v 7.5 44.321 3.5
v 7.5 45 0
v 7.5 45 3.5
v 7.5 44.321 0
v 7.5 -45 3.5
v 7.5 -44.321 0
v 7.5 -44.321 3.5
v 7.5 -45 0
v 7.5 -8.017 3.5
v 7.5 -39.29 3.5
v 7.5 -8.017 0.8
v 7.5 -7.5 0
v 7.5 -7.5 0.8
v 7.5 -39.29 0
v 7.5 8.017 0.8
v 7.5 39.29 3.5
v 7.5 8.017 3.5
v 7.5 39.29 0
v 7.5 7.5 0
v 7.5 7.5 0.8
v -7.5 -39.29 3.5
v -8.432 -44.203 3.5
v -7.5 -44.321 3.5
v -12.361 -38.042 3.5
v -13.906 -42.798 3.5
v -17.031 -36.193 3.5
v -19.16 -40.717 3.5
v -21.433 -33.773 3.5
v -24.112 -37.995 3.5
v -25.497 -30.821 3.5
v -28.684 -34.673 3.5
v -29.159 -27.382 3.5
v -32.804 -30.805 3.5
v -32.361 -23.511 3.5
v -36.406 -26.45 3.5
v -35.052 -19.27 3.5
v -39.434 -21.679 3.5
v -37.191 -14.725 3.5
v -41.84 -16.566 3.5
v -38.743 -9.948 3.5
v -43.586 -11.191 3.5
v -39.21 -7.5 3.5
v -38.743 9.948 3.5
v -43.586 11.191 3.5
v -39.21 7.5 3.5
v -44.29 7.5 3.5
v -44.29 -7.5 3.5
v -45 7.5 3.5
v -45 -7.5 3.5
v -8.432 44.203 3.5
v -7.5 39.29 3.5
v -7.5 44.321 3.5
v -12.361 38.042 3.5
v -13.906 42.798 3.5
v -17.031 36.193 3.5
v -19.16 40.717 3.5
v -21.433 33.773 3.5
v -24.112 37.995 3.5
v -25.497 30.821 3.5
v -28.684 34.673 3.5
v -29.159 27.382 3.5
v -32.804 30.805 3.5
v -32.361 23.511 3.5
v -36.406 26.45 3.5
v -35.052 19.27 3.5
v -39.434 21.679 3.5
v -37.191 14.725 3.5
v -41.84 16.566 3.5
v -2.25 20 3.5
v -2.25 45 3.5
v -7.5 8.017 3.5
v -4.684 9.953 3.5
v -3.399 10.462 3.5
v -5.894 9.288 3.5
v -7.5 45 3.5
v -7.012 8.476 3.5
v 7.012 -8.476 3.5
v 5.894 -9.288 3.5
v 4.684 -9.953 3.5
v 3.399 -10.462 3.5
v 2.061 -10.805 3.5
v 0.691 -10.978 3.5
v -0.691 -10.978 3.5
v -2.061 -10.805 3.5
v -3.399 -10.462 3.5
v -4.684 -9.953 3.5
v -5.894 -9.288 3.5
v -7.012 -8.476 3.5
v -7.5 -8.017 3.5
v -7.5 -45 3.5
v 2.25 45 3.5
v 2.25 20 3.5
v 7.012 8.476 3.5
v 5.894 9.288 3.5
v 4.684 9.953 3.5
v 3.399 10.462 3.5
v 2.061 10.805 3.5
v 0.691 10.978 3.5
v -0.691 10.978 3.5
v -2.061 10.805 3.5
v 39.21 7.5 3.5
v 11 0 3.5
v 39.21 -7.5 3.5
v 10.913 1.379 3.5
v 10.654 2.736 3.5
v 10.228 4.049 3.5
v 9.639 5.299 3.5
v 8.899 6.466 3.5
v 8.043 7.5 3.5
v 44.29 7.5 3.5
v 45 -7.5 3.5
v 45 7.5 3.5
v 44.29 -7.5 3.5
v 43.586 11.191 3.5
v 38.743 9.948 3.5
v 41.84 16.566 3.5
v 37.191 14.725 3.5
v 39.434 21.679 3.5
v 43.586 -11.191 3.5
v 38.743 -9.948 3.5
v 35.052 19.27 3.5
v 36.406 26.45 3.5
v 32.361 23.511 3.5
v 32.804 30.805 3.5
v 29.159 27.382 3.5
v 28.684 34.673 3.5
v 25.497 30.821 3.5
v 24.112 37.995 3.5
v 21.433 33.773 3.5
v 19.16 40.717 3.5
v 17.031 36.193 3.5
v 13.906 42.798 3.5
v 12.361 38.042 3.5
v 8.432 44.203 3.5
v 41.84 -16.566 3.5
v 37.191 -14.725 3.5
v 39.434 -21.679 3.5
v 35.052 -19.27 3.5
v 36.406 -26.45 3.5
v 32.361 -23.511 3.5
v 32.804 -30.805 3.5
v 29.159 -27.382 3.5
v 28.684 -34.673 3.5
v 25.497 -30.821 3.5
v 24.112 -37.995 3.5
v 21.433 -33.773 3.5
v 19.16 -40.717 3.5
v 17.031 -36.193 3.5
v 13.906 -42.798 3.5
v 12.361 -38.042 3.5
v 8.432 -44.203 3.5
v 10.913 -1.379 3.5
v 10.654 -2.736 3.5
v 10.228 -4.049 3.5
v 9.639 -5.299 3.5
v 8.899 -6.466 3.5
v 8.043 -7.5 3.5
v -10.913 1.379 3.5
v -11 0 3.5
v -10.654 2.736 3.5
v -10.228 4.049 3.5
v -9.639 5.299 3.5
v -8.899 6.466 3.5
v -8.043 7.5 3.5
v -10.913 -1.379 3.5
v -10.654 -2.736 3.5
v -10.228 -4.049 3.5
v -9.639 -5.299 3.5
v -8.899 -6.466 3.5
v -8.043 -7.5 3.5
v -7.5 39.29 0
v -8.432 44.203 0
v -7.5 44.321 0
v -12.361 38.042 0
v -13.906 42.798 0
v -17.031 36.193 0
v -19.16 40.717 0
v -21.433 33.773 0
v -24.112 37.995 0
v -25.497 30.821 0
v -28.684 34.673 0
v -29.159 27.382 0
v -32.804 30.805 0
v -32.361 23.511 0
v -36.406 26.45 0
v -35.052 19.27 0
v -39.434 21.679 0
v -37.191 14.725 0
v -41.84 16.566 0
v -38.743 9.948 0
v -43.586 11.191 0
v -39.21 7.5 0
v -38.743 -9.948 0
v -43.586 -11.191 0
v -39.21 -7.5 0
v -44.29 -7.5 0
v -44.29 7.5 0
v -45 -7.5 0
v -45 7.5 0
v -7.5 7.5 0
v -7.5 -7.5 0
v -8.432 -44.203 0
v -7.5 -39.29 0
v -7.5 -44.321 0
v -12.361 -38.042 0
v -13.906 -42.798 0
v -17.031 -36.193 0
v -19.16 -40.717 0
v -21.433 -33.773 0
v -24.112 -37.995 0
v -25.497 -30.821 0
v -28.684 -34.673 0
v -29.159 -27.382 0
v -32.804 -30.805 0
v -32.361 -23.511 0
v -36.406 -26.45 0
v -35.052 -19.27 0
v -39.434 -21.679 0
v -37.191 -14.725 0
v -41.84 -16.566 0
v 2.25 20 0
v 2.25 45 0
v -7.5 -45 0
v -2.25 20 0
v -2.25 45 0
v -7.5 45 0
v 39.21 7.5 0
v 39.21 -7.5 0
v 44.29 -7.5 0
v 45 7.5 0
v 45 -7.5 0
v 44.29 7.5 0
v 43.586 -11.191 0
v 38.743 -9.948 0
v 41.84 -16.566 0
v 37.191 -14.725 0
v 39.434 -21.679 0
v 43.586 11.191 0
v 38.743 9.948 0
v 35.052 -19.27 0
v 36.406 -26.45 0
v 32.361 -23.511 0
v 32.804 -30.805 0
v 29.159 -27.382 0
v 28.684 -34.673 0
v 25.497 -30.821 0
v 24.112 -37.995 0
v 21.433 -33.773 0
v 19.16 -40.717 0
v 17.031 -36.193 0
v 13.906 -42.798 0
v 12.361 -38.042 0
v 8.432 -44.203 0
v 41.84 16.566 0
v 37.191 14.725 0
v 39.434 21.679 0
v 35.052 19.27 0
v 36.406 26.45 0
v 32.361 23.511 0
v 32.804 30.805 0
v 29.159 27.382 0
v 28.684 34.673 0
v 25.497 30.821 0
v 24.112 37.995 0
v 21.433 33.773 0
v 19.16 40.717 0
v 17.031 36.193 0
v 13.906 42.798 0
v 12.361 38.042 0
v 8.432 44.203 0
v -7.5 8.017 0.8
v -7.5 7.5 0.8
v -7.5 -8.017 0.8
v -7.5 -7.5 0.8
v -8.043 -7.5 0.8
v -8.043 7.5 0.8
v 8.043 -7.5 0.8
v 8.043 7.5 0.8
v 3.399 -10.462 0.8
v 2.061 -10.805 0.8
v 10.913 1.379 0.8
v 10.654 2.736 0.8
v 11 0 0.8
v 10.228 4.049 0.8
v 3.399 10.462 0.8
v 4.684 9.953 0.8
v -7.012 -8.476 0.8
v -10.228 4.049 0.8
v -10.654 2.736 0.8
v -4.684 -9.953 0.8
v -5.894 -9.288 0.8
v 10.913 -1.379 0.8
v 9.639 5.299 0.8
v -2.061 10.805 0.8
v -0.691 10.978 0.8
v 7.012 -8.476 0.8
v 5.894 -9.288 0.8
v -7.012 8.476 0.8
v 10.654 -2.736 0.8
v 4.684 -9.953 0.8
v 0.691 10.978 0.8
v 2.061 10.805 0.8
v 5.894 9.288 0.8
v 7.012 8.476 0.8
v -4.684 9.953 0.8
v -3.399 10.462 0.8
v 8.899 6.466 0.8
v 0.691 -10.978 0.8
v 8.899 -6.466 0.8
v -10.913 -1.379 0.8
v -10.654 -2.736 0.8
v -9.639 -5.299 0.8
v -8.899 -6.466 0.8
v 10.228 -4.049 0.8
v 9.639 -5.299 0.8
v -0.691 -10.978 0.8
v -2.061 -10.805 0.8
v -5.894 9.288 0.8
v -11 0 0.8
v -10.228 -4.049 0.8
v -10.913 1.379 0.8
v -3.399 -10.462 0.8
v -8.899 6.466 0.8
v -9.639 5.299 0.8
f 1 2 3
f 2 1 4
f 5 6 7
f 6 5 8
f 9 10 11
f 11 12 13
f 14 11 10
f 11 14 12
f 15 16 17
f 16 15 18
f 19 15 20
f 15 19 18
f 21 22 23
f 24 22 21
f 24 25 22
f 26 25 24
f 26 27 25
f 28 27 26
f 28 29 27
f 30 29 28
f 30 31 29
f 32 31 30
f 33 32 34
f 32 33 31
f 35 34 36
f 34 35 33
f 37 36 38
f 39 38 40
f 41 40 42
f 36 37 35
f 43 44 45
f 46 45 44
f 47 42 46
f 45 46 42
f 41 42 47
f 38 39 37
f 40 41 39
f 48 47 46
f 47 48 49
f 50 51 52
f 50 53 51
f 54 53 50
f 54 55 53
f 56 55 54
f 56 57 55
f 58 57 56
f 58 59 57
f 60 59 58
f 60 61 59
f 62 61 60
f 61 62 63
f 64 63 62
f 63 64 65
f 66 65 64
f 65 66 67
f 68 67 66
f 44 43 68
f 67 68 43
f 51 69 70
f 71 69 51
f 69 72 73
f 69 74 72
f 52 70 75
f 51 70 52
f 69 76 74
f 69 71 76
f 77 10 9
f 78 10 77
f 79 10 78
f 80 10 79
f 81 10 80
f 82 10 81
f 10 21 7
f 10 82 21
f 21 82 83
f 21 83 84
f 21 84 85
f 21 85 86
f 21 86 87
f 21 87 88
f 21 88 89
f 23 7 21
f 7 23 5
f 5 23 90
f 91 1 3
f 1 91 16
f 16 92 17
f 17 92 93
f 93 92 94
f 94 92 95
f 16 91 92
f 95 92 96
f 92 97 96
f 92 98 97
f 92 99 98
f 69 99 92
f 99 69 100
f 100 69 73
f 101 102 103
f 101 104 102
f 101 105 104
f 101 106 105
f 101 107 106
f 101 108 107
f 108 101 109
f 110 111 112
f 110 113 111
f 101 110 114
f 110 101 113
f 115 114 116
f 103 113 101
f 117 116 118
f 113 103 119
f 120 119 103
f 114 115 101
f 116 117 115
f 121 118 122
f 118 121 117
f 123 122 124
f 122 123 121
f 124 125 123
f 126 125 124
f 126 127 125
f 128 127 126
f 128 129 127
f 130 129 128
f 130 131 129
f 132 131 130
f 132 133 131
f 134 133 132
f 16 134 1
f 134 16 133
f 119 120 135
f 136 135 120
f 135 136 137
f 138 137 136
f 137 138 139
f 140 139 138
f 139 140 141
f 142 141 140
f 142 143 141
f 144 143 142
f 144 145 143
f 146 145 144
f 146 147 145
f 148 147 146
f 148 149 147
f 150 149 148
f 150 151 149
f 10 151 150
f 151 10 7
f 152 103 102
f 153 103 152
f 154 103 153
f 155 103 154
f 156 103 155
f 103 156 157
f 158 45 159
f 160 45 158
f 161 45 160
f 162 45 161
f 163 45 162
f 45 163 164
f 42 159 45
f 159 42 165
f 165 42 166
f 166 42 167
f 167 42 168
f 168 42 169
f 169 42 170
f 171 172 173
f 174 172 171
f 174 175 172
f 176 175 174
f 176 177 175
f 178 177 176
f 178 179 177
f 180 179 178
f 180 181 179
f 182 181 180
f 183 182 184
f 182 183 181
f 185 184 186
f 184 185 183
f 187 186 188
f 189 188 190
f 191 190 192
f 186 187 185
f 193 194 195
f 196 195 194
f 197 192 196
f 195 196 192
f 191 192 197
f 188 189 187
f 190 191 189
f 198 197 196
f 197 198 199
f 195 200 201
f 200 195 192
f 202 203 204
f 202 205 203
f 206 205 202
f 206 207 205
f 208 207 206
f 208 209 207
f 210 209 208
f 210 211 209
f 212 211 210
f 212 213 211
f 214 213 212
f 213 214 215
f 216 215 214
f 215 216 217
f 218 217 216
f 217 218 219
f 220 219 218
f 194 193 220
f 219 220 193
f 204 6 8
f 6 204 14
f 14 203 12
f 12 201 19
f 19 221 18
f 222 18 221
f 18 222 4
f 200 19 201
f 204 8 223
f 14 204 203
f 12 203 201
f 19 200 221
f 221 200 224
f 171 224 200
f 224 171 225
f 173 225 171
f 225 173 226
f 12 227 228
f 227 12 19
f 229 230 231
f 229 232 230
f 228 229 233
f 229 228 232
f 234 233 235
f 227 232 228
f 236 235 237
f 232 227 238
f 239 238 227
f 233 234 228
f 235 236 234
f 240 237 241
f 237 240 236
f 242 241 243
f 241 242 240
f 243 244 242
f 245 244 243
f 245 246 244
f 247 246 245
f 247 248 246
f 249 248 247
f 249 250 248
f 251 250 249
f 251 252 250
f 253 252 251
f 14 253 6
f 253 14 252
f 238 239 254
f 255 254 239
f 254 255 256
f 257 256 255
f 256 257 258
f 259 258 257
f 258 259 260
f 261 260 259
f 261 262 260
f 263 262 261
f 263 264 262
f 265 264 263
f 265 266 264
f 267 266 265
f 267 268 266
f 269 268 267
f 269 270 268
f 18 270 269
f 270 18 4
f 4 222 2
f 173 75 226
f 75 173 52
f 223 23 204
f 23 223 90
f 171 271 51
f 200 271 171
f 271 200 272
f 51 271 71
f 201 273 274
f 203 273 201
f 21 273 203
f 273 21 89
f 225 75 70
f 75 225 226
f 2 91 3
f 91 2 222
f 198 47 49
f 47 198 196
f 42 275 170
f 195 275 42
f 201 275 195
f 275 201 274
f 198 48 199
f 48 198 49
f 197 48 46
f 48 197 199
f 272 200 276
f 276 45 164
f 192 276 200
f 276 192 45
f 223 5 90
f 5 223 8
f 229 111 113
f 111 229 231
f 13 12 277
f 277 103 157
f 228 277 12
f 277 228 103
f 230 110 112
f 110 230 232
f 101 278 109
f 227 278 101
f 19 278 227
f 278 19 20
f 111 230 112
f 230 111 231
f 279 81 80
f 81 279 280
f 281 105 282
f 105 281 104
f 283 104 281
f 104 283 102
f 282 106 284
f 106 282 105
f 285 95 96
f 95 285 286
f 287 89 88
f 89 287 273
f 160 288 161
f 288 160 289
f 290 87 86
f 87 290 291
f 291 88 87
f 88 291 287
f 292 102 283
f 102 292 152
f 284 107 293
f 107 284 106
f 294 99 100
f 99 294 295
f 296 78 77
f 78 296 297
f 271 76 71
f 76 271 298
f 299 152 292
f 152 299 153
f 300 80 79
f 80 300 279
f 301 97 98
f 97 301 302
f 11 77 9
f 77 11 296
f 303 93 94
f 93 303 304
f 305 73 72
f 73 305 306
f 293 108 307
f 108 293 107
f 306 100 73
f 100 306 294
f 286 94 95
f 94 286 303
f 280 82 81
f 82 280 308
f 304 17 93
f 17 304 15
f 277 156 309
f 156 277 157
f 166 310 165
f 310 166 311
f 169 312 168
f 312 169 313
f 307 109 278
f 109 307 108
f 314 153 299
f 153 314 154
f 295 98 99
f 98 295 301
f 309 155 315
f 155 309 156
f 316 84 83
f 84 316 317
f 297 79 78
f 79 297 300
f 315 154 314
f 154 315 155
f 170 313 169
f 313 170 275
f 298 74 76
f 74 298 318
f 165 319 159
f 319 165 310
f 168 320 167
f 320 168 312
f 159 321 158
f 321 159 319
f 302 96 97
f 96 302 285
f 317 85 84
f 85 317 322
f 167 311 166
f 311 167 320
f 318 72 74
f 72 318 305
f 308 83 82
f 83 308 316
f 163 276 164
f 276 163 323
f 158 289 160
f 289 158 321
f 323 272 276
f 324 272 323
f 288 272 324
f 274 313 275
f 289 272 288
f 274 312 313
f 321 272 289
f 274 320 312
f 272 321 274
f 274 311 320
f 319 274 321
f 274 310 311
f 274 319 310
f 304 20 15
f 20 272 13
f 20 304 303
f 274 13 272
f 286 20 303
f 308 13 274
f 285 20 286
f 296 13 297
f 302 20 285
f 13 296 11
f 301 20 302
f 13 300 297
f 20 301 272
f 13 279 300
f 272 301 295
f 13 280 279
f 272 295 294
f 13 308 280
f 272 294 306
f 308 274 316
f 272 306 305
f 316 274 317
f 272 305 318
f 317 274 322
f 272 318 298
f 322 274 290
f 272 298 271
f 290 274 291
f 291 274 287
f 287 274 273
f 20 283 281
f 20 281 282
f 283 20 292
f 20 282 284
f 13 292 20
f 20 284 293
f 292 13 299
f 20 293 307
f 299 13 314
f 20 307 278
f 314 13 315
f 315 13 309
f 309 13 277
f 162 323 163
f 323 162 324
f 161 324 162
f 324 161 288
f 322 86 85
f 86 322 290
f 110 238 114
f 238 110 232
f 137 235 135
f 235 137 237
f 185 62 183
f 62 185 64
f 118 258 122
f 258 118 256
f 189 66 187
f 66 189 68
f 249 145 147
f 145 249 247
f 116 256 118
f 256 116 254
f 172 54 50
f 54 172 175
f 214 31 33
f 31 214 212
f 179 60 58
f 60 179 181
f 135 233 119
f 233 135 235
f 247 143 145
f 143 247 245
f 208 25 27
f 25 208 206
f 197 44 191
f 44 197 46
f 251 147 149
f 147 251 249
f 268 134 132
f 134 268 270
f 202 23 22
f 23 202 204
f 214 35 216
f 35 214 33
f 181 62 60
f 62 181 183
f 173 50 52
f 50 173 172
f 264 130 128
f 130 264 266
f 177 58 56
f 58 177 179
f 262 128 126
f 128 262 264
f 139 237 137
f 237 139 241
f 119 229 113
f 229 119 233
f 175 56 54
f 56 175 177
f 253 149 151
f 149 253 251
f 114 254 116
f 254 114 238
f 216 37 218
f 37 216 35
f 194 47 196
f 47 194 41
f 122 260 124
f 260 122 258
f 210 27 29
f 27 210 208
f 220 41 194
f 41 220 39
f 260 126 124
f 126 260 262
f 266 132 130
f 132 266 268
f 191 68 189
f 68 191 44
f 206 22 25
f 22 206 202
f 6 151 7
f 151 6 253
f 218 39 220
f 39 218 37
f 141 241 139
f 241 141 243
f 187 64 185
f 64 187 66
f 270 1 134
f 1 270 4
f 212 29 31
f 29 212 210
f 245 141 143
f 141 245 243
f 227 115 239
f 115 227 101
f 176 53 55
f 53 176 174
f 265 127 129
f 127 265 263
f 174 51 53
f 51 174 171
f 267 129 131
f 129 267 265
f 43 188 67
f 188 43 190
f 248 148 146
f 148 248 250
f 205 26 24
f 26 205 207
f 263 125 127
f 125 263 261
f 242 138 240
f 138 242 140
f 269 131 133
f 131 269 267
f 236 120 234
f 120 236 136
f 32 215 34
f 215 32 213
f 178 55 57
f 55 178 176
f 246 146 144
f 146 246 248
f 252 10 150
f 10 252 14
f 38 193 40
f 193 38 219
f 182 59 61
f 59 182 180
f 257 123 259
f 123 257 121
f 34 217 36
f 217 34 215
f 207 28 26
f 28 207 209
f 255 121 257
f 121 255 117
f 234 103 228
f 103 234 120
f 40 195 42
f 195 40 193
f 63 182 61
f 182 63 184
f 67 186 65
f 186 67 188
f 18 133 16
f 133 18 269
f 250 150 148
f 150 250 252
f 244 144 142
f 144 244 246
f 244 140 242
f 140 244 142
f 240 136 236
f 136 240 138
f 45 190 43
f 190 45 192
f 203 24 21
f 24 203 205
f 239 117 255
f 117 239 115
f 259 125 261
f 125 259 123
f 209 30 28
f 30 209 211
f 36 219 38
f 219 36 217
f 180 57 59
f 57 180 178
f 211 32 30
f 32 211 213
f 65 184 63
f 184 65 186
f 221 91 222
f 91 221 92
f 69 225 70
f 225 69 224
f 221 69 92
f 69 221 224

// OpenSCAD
base_cap_diameter = 22;
base_cap_height = 1;
base_cap_radius = base_cap_diameter/2;

top_base_cap_height = 2.7;

base_height = 3.5;
base_diameter = 90;
base_radius = base_diameter/2;

strut_num = 4;
strut_width = 15;

$fn = 50;

module BaseCross() {
    strut_stride = 360 / strut_num;
    for (a =[0:strut_num]){
        rotate([0,0,strut_stride * a]) {
            translate([-strut_width/2, 0,0]) {
                cube([strut_width, base_radius, base_height]);
            }
        }
    }
}

module Base() {
    difference() {
        BaseCross();
        translate([0,0, base_height - base_cap_height]) {
            cylinder(base_height, base_cap_radius, base_cap_radius, false);
        }
    }
}

module BaseRadius() {
    base_rim = 5;
    difference() {
        cylinder(base_height, base_radius, base_radius, false);
        cylinder(base_height, base_radius -base_rim, base_radius - base_rim, false);
    }
}

module DrawBottom() {
    Base();
    BaseRadius();
}

module Base() {
    difference() {
        BaseCross();
        translate([0,0, base_height - top_base_cap_height]) {
            cylinder(top_base_cap_height, base_cap_radius, base_cap_radius, false);
        }
    }
}

module Top() {
    difference() {
        BaseCross();
        translate([0,0, base_height - base_cap_height]) {
            cylinder(top_base_cap_height, base_cap_radius, base_cap_radius, false);
        }
    }
}

module DrawTop() {
    notch_width = 4.5;
    notch_from_edge = 25;
    difference() {
        
        union() {
            Base();
            BaseRadius();
        }
        
        translate([- notch_width/2, base_radius-notch_from_edge, 0]) {
            cube([notch_width, notch_from_edge, base_height]);
        }
    }
}

DrawTop();
